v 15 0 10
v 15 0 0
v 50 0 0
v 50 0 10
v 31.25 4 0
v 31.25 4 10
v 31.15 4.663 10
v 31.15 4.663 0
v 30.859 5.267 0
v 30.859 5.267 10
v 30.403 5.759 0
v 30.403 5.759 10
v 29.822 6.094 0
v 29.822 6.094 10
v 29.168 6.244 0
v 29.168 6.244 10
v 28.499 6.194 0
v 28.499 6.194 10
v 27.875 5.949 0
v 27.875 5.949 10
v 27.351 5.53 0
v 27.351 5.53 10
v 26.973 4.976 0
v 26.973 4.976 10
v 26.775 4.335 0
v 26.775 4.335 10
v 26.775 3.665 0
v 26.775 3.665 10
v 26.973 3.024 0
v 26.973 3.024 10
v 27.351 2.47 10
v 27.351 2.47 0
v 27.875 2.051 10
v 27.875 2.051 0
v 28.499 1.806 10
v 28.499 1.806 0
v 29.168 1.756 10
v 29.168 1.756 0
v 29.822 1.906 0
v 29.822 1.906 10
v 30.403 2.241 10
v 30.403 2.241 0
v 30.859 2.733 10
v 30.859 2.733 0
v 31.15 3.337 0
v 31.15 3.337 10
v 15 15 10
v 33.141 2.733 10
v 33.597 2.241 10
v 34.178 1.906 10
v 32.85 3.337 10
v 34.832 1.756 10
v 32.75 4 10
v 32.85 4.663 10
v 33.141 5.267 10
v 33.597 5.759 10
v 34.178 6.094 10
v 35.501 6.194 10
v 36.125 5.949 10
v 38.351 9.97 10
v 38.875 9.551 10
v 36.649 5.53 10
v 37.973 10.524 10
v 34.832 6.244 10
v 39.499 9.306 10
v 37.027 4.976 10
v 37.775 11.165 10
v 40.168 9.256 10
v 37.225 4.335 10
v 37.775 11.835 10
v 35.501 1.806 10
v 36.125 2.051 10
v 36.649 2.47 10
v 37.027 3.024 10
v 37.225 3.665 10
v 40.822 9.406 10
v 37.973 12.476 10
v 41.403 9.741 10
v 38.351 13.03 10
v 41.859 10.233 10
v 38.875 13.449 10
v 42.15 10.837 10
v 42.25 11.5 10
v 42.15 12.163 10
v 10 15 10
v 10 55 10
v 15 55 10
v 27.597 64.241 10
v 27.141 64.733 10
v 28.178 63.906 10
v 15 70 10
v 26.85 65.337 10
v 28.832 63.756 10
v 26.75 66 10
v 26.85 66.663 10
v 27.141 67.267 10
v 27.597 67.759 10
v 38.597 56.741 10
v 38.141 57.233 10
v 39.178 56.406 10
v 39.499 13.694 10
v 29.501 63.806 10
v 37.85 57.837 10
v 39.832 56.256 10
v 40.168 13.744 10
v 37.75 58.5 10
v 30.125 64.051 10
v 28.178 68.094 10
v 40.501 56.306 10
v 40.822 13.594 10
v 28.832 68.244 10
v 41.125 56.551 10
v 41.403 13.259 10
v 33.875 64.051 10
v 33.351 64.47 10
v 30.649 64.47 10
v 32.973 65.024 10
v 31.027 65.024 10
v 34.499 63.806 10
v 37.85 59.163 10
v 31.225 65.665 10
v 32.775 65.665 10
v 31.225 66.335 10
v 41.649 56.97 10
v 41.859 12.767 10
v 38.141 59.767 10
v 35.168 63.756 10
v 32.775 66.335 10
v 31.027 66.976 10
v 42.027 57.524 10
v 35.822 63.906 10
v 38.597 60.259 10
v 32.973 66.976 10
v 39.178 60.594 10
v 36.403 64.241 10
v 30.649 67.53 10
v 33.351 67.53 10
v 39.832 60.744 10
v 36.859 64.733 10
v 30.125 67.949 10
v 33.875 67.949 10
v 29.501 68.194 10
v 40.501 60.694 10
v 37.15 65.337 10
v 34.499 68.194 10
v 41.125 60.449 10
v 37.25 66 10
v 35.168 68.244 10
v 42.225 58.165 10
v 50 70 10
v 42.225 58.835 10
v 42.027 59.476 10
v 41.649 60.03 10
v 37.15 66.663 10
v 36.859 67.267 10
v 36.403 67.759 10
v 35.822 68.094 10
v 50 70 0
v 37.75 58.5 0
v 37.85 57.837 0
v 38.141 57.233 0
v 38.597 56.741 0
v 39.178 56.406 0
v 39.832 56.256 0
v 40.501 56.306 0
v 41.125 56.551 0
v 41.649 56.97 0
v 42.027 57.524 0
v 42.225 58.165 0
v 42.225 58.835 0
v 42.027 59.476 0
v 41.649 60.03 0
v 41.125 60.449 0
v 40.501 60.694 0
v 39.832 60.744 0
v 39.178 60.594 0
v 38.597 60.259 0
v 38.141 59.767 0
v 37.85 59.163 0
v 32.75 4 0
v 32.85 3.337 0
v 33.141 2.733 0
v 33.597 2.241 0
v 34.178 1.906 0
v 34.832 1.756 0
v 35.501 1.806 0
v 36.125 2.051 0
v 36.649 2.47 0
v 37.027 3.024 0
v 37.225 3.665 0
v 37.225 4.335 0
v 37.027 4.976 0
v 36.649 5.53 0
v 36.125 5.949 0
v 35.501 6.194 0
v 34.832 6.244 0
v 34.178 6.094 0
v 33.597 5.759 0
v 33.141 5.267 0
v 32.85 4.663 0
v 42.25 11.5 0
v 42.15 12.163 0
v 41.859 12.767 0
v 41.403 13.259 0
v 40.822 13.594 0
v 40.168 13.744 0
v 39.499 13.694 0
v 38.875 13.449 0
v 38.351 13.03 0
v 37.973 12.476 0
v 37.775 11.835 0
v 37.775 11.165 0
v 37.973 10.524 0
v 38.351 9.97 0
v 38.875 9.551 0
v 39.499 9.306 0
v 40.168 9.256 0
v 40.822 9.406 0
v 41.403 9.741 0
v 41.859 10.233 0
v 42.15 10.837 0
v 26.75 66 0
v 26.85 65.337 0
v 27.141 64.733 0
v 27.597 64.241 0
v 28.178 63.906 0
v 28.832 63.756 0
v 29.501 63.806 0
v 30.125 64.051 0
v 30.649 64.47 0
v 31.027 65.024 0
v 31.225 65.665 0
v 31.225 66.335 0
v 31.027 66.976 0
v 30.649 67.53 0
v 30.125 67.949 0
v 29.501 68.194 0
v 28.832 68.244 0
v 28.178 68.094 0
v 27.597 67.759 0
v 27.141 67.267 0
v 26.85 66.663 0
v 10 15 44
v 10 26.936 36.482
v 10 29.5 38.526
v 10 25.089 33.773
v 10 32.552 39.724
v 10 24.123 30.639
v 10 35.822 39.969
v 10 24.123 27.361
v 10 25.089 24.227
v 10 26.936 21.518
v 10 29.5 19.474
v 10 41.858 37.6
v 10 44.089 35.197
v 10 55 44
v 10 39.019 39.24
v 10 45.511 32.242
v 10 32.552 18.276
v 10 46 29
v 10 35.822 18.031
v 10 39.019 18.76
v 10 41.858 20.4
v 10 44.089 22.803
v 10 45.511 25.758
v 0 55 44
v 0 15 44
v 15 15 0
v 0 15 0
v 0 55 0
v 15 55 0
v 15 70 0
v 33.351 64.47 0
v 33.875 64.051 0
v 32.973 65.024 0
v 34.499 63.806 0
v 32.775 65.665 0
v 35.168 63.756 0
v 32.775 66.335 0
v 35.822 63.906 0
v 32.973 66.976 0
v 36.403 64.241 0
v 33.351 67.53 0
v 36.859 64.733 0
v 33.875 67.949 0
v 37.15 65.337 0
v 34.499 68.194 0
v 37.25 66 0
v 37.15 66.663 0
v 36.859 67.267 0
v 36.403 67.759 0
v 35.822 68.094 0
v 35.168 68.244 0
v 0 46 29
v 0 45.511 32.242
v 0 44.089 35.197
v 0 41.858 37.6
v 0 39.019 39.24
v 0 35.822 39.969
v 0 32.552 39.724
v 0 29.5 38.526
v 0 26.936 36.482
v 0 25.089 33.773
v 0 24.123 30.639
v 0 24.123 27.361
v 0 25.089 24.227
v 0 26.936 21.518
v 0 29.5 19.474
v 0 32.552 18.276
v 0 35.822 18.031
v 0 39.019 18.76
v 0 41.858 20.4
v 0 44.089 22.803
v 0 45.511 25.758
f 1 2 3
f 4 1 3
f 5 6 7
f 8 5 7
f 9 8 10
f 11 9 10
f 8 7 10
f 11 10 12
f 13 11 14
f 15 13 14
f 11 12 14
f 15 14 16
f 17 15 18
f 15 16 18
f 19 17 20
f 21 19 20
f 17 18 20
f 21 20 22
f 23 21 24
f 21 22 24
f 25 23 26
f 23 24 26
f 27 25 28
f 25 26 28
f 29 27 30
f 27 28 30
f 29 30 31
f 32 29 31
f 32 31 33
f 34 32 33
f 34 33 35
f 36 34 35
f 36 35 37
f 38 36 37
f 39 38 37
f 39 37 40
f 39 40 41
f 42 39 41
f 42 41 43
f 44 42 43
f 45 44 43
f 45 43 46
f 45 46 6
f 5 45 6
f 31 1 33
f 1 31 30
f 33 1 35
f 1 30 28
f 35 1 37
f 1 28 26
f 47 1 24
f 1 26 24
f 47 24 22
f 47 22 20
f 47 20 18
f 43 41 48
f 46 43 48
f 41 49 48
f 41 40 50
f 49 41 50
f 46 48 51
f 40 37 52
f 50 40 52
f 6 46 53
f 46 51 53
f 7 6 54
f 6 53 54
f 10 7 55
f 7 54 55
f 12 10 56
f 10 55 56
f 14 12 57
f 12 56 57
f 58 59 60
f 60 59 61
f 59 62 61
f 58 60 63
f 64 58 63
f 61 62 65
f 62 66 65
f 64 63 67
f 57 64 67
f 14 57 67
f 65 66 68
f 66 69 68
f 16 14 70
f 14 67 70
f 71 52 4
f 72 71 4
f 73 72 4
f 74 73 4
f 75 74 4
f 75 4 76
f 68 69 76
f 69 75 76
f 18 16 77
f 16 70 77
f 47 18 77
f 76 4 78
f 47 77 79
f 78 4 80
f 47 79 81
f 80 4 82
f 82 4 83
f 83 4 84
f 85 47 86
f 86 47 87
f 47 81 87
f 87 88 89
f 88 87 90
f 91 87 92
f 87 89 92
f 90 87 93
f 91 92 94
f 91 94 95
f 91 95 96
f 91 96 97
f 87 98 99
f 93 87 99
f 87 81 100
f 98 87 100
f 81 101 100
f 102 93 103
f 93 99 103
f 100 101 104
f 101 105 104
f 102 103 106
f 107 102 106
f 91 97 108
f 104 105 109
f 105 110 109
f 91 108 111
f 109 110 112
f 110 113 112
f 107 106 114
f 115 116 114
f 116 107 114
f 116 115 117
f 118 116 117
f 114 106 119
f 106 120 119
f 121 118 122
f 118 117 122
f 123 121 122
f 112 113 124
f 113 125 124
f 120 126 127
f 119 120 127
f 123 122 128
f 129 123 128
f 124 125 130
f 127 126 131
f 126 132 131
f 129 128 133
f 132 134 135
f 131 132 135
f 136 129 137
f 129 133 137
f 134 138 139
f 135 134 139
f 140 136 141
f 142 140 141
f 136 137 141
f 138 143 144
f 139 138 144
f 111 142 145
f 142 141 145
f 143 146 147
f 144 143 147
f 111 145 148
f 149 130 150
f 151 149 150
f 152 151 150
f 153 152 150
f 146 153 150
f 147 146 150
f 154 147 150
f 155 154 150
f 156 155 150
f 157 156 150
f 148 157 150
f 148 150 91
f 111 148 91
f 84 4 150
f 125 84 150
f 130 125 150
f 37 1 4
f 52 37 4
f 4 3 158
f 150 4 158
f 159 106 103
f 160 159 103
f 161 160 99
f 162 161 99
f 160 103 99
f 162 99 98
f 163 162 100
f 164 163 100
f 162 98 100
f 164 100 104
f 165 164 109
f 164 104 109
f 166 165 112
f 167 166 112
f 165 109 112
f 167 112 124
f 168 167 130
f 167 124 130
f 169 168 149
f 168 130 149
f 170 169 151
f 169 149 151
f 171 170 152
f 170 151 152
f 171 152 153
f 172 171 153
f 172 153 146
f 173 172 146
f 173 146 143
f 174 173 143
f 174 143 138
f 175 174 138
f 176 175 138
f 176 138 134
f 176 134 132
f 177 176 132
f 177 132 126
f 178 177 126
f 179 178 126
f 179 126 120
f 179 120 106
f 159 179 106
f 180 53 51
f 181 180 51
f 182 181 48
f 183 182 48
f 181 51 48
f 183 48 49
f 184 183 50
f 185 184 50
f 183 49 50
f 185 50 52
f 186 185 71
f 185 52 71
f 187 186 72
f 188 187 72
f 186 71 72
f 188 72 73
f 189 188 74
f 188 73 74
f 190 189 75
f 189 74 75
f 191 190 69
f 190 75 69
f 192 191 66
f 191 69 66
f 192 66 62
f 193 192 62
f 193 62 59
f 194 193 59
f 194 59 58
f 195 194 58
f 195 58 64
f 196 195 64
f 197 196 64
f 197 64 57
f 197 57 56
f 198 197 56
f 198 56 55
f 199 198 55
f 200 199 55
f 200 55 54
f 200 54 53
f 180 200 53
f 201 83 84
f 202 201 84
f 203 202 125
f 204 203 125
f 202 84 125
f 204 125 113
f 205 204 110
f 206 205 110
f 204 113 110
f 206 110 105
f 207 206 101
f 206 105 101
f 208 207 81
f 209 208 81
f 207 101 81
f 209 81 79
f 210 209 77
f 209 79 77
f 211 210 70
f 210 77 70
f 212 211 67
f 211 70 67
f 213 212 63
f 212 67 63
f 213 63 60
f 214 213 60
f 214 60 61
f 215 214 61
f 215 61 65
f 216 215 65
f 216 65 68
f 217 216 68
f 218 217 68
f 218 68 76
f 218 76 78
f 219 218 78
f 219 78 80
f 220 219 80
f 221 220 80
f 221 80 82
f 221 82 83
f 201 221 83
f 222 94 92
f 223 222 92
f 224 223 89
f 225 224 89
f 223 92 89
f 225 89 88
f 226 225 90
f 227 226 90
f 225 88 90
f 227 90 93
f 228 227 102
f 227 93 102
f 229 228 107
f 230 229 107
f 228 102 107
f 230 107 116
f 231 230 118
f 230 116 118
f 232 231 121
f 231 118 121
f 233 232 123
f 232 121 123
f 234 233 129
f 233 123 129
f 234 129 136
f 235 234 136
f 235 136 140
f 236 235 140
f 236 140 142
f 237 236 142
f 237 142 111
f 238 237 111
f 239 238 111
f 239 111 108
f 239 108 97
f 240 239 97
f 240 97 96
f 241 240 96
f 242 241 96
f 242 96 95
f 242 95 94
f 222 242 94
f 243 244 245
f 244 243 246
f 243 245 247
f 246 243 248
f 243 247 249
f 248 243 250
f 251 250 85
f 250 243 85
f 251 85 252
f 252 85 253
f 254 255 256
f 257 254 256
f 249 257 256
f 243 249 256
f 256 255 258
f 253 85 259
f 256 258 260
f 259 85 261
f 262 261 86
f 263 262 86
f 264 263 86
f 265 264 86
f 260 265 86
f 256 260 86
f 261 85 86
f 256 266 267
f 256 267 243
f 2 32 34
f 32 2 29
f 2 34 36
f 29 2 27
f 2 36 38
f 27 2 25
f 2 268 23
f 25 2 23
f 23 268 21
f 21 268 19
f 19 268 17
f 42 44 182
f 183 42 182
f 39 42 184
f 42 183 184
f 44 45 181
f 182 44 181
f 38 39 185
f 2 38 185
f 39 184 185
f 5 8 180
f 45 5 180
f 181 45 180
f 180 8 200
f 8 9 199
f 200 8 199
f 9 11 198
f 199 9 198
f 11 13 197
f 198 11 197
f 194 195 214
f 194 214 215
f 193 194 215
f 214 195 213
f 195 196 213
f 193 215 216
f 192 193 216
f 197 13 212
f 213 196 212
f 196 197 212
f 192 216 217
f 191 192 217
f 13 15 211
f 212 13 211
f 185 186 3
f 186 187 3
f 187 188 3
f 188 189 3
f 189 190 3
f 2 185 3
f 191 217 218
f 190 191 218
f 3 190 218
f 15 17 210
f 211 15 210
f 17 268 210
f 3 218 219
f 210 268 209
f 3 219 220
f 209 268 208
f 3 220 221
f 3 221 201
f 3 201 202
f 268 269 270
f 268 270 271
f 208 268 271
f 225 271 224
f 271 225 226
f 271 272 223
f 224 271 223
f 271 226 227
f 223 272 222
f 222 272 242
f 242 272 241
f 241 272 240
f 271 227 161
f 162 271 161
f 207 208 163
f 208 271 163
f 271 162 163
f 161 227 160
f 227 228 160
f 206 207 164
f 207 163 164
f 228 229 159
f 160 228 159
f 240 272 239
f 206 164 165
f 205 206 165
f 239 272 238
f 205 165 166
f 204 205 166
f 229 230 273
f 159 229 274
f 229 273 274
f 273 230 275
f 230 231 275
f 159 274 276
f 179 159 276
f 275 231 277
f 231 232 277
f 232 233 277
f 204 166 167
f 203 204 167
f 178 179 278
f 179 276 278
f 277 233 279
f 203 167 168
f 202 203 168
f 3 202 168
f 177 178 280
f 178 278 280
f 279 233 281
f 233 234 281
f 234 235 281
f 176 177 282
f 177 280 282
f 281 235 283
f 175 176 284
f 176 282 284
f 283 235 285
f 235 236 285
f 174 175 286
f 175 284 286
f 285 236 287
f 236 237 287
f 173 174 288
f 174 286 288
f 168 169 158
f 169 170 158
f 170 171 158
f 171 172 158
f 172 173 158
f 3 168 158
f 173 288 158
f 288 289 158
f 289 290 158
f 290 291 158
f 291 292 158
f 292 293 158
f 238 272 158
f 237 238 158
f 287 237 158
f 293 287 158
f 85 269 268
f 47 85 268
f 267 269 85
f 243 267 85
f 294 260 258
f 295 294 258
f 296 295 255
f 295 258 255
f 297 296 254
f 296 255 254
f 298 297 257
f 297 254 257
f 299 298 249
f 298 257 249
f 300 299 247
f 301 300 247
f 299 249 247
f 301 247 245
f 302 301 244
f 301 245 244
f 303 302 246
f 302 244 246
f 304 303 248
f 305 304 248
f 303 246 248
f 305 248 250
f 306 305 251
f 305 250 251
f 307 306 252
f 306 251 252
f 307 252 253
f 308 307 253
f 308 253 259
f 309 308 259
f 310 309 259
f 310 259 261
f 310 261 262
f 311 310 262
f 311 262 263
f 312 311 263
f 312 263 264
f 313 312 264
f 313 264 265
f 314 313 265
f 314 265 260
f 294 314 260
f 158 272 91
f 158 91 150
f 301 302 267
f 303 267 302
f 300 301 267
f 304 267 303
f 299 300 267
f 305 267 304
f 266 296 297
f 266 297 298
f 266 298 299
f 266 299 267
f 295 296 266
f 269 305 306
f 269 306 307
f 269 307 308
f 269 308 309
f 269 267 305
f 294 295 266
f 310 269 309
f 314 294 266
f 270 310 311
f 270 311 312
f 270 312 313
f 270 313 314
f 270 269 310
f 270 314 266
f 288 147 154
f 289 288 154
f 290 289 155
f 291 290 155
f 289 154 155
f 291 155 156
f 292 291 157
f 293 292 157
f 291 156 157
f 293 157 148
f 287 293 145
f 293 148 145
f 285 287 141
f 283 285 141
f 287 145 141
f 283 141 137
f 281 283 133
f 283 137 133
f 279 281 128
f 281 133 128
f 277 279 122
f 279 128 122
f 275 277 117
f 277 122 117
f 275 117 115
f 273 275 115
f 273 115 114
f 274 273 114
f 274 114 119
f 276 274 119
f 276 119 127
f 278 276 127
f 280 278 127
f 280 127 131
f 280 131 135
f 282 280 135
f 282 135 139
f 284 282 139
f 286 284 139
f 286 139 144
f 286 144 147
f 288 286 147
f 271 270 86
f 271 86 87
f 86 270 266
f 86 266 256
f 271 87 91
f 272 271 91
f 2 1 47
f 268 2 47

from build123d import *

# Parameters (mm, degrees)
SKETCH_1_W          = 50
SKETCH_1_H          = 70
EXTRUDE_1_DEPTH     = 10
SKETCH_2_W          = 10
SKETCH_2_H          = 70
EXTRUDE_2_DEPTH     = 34
SKETCH_3_R          = 11
CUT_EXTRUDE_1_DEPTH = 32
SKETCH_4_R          = 2.25
CUT_EXTRUDE_2_DEPTH = 93.498648639
SKETCH_5_R          = 2.25
CUT_EXTRUDE_3_DEPTH = 93.498648639
SKETCH_6_W          = 34
SKETCH_6_H          = 15
CUT_EXTRUDE_4_DEPTH = 92.847700026
SKETCH_7_W          = 15
SKETCH_7_H          = 15
CUT_EXTRUDE_5_DEPTH = 93.498648639


with BuildPart() as part:
    # 草图1 → 凸台-拉伸1 (new body)
    with BuildSketch(Plane.XY):
        with Locations((25, 35)):
            Rectangle(SKETCH_1_W, SKETCH_1_H)
    extrude(amount=EXTRUDE_1_DEPTH)

    # 草图2 → 凸台-拉伸2 (add)
    with BuildSketch(Plane.XY.offset(10)):
        with Locations((5, 35)):
            Rectangle(SKETCH_2_W, SKETCH_2_H)
    extrude(amount=EXTRUDE_2_DEPTH)

    # 草图3 → 切除-拉伸1 (cut)
    with BuildSketch(Plane(origin=(10, 0, 0), x_dir=(0, 0, -1), z_dir=(1, 0, 0))):
        with Locations(Location((-29, 35, 0), (0, 0, 90))):
            Circle(SKETCH_3_R)
    extrude(amount=-CUT_EXTRUDE_1_DEPTH, mode=Mode.SUBTRACT)

    # 草图4 → 切除-拉伸2 (cut, through all)
    with BuildSketch(Plane.XY.offset(10)):
        with Locations((40, 11.5)):
            Circle(SKETCH_4_R)
        with Locations(Location((40, 58.5, 0), (0, 0, 180))):
            Circle(SKETCH_4_R)
    extrude(amount=-CUT_EXTRUDE_2_DEPTH, mode=Mode.SUBTRACT)

    # 草图5 → 切除-拉伸3 (cut, through all)
    with BuildSketch(Plane.XY.offset(10)):
        with Locations((35, 66)):
            Circle(SKETCH_5_R)
        with Locations(Location((35, 4, 0), (0, 0, 180))):
            Circle(SKETCH_5_R)
        with Locations((29, 4)):
            Circle(SKETCH_5_R)
        with Locations(Location((29, 66, 0), (0, 0, 180))):
            Circle(SKETCH_5_R)
    extrude(amount=-CUT_EXTRUDE_3_DEPTH, mode=Mode.SUBTRACT)

    # 草图6 → 切除-拉伸4 (cut, through all)
    with BuildSketch(Plane(origin=(10, 0, 0), x_dir=(0, 0, -1), z_dir=(1, 0, 0))):
        with Locations((-27, 7.5)):
            Rectangle(SKETCH_6_W, SKETCH_6_H)
        with Locations((-27, 62.5)):
            Rectangle(SKETCH_6_W, SKETCH_6_H)
    extrude(amount=-CUT_EXTRUDE_4_DEPTH, mode=Mode.SUBTRACT)

    # 草图7 → 切除-拉伸5 (cut, through all)
    with BuildSketch(Plane.XY.offset(10)):
        with Locations((7.5, 7.5)):
            Rectangle(SKETCH_7_W, SKETCH_7_H)
        with Locations((7.5, 62.5)):
            Rectangle(SKETCH_7_W, SKETCH_7_H)
    extrude(amount=-CUT_EXTRUDE_5_DEPTH, mode=Mode.SUBTRACT)


solid = part.part
